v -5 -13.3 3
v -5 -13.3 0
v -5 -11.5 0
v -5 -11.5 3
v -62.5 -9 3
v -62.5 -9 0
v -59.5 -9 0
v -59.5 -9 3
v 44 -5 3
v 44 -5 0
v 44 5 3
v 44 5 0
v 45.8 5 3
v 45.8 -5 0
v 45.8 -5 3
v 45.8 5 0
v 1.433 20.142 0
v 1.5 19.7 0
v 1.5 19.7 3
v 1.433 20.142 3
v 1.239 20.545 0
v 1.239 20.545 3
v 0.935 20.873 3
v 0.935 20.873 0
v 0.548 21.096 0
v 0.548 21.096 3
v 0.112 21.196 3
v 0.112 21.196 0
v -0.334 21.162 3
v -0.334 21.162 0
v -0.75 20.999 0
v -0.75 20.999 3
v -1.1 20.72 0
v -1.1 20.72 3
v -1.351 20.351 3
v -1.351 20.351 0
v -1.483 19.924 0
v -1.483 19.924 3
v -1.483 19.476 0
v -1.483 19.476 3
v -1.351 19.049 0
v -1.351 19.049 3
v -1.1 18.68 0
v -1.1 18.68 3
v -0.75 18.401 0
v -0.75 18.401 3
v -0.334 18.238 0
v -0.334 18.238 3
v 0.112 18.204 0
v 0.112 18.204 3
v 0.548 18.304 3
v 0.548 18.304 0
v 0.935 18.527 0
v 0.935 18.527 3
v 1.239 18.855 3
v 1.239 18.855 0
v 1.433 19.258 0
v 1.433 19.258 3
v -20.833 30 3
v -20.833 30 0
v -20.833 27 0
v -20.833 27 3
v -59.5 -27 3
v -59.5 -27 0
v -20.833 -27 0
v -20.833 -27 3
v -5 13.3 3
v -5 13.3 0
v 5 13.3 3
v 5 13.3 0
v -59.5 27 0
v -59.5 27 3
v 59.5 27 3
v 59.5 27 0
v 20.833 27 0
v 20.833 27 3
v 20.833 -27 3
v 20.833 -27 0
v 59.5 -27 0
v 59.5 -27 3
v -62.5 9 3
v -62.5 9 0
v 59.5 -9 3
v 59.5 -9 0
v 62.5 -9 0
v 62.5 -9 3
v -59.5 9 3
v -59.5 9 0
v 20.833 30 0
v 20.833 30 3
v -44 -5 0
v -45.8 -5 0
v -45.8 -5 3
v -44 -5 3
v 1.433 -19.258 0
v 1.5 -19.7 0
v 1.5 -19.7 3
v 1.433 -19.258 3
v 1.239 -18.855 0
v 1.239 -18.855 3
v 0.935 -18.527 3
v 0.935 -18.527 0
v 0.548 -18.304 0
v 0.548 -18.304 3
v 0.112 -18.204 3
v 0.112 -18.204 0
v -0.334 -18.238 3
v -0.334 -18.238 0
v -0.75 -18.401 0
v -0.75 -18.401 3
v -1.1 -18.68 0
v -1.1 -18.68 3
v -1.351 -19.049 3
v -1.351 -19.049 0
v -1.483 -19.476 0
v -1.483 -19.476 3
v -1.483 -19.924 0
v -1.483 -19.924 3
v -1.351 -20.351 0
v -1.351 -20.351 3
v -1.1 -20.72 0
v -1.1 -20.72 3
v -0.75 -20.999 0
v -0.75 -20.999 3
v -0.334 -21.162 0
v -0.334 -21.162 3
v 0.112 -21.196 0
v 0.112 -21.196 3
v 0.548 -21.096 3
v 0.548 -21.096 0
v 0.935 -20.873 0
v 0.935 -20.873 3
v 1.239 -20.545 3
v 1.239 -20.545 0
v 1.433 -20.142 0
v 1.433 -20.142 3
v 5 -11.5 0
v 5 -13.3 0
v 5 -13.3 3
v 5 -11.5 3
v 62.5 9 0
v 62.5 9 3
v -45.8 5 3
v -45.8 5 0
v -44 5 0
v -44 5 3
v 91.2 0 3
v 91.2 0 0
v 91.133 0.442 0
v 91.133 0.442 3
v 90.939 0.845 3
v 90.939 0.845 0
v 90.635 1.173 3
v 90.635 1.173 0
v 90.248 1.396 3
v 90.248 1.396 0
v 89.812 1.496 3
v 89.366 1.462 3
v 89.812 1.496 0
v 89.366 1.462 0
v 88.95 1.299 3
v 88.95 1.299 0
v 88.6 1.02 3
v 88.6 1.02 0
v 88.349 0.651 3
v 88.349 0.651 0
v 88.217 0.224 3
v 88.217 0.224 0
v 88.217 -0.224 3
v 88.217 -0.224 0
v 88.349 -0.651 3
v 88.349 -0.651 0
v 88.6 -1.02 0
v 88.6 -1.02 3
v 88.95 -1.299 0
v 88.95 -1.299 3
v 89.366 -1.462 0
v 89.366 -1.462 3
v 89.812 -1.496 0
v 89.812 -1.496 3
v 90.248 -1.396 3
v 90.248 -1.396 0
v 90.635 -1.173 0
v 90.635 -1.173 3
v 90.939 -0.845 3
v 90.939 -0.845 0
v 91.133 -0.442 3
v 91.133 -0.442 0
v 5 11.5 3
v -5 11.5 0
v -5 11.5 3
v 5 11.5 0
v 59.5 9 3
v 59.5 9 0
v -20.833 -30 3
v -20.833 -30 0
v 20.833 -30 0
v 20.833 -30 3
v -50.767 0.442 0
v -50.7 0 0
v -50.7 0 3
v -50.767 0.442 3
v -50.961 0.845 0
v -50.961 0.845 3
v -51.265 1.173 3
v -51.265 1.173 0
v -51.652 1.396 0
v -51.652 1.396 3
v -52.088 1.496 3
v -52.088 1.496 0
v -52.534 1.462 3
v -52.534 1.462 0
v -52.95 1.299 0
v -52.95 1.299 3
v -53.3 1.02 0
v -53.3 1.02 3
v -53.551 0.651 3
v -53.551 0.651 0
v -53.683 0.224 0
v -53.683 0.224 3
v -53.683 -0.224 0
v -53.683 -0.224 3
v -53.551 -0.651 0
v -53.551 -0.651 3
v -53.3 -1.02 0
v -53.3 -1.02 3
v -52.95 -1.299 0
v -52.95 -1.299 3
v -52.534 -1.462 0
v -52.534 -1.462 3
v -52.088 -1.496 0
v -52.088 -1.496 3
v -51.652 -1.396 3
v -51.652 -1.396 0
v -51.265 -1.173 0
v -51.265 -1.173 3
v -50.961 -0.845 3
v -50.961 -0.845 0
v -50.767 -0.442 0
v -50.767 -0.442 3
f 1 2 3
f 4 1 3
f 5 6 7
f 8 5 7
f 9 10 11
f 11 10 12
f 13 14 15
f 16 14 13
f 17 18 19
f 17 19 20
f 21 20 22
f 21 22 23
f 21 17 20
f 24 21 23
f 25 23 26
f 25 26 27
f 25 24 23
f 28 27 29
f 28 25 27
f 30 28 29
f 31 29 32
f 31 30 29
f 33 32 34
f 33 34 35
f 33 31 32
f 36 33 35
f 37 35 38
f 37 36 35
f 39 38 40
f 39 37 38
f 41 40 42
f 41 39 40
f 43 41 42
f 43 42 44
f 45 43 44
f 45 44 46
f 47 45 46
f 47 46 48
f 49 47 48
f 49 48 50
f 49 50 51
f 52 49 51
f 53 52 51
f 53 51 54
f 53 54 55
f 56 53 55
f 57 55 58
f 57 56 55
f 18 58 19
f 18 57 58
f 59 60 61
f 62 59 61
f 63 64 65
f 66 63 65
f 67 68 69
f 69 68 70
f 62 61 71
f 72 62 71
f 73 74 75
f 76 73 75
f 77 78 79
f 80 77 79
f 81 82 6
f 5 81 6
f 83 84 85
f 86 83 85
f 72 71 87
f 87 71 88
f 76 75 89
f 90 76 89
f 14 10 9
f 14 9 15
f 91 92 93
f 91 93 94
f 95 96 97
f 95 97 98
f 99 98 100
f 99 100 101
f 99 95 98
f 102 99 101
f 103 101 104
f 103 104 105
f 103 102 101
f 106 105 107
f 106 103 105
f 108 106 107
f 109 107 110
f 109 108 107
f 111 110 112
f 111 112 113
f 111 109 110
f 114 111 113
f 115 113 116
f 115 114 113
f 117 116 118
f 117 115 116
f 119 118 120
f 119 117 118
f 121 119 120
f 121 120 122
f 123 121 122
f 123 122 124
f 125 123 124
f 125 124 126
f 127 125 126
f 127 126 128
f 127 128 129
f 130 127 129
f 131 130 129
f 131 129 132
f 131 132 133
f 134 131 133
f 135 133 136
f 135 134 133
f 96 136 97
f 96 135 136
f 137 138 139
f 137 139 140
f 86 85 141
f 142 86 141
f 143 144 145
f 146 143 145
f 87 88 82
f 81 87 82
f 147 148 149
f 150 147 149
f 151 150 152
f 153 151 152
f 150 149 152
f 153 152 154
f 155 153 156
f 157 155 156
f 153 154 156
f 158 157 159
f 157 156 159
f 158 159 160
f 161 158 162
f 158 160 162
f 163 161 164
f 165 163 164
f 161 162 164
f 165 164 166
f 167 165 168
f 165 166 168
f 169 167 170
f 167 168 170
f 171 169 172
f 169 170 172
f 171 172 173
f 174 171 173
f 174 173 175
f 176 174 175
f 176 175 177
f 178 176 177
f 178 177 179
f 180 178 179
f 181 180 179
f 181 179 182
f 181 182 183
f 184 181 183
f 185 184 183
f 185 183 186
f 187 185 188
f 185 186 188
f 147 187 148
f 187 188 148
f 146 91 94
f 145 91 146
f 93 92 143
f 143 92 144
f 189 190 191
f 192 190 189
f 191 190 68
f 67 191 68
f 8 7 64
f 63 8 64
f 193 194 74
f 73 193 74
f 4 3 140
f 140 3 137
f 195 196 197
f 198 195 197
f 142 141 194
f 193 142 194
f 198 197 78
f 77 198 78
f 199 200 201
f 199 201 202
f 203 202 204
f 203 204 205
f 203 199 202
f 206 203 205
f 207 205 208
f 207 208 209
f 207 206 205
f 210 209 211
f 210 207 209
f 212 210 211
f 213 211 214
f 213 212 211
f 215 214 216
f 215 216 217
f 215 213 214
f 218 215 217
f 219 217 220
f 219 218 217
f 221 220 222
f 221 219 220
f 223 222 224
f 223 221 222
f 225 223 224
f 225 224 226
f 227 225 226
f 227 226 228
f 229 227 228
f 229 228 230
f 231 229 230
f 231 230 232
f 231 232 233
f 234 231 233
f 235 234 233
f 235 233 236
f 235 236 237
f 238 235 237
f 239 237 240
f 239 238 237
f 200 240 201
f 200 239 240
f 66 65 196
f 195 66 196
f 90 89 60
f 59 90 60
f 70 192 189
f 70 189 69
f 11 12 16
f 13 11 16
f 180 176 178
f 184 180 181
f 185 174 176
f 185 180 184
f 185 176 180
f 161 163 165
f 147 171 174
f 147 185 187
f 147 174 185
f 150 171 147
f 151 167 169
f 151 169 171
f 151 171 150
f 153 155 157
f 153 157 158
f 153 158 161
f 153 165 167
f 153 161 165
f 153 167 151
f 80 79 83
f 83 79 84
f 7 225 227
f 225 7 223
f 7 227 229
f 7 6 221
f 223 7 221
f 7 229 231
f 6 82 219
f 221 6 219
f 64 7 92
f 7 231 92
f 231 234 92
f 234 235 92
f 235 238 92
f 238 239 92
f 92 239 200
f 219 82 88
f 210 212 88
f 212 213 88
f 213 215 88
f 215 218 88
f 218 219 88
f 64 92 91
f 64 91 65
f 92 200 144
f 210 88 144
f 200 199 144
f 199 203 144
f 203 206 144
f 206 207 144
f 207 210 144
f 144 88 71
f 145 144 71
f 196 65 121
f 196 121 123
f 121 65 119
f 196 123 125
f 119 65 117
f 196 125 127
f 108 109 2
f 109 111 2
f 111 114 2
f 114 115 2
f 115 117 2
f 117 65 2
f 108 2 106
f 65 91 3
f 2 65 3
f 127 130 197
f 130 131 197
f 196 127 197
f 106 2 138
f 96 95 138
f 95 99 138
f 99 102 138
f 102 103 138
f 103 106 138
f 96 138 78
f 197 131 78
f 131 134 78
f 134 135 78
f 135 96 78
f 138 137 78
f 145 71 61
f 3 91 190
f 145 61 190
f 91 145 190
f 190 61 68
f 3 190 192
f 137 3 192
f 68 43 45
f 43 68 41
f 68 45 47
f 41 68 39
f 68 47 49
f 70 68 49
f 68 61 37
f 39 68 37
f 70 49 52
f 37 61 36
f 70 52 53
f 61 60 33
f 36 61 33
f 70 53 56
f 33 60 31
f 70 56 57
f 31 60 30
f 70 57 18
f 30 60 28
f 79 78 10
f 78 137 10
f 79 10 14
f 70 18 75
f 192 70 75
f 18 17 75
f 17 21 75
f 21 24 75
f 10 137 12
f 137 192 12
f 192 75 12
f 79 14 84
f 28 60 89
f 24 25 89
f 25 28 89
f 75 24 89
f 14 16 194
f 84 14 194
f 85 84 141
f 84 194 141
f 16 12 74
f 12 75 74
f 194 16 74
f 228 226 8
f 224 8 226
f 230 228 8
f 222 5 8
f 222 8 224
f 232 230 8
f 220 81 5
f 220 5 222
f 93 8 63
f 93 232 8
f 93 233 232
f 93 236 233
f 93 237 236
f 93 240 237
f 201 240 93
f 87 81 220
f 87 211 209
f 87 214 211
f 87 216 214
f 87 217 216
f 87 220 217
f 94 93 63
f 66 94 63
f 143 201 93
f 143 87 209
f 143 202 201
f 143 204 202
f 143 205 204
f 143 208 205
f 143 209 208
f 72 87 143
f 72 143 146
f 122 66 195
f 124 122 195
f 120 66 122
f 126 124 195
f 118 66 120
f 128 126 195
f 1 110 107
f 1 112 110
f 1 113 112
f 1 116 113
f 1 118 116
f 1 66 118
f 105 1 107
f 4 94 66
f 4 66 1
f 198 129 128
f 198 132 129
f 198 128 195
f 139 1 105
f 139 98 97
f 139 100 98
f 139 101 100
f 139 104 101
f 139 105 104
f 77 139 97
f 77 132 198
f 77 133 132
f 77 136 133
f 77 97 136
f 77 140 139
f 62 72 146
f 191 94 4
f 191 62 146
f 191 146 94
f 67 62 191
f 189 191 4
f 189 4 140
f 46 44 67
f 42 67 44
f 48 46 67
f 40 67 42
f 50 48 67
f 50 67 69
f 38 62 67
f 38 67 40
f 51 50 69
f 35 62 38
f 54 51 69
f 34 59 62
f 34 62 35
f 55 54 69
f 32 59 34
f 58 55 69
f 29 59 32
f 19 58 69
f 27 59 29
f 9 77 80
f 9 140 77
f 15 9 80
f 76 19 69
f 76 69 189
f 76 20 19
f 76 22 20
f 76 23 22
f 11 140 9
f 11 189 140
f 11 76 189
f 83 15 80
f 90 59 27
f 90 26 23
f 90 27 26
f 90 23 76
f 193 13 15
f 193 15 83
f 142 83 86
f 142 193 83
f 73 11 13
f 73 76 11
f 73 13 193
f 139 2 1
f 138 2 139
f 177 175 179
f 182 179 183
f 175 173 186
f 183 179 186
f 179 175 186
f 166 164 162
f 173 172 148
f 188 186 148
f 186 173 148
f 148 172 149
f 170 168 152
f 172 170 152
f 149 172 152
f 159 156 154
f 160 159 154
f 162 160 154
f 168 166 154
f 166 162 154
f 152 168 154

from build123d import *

# Parameters (mm, degrees)
F0_R     = 1.5
F0_W     = 10
F0_H     = 1.8
F0_W_2   = 1.8
F0_H_2   = 10
F1_DEPTH = 3


with BuildPart() as f1:
    # F0 (on Top) → F1 (new body)
    with BuildSketch(Plane.XY):
        Polygon((-20.833333, 27), (-59.5, 27), (-59.5, 9), (-62.5, 9), (-62.5, -9), (-59.5, -9), (-59.5, -27), (-20.833333, -27), (-20.833333, -30), (20.833333, -30), (20.833333, -27), (59.5, -27), (59.5, -9), (62.5, -9), (62.5, 9), (59.5, 9), (59.5, 27), (20.833333, 27), (20.833333, 30), (-20.833333, 30), align=None)
        with Locations((0, -19.7)):
            Circle(F0_R, mode=Mode.SUBTRACT)
        with Locations((0, -12.4)):
            Rectangle(F0_W, F0_H, mode=Mode.SUBTRACT)
        with Locations((-52.2, 0)):
            Circle(F0_R, mode=Mode.SUBTRACT)
        with Locations((-44.9, 0)):
            Rectangle(F0_W_2, F0_H_2, mode=Mode.SUBTRACT)
        with Locations((0, 12.4)):
            Rectangle(F0_W, F0_H, mode=Mode.SUBTRACT)
        with Locations((0, 19.7)):
            Circle(F0_R, mode=Mode.SUBTRACT)
        with Locations((44.9, 0)):
            Rectangle(F0_W_2, F0_H_2, mode=Mode.SUBTRACT)
        with Locations((89.7, 0)):
            Circle(F0_R)
    extrude(amount=F1_DEPTH)


solid = f1.part
